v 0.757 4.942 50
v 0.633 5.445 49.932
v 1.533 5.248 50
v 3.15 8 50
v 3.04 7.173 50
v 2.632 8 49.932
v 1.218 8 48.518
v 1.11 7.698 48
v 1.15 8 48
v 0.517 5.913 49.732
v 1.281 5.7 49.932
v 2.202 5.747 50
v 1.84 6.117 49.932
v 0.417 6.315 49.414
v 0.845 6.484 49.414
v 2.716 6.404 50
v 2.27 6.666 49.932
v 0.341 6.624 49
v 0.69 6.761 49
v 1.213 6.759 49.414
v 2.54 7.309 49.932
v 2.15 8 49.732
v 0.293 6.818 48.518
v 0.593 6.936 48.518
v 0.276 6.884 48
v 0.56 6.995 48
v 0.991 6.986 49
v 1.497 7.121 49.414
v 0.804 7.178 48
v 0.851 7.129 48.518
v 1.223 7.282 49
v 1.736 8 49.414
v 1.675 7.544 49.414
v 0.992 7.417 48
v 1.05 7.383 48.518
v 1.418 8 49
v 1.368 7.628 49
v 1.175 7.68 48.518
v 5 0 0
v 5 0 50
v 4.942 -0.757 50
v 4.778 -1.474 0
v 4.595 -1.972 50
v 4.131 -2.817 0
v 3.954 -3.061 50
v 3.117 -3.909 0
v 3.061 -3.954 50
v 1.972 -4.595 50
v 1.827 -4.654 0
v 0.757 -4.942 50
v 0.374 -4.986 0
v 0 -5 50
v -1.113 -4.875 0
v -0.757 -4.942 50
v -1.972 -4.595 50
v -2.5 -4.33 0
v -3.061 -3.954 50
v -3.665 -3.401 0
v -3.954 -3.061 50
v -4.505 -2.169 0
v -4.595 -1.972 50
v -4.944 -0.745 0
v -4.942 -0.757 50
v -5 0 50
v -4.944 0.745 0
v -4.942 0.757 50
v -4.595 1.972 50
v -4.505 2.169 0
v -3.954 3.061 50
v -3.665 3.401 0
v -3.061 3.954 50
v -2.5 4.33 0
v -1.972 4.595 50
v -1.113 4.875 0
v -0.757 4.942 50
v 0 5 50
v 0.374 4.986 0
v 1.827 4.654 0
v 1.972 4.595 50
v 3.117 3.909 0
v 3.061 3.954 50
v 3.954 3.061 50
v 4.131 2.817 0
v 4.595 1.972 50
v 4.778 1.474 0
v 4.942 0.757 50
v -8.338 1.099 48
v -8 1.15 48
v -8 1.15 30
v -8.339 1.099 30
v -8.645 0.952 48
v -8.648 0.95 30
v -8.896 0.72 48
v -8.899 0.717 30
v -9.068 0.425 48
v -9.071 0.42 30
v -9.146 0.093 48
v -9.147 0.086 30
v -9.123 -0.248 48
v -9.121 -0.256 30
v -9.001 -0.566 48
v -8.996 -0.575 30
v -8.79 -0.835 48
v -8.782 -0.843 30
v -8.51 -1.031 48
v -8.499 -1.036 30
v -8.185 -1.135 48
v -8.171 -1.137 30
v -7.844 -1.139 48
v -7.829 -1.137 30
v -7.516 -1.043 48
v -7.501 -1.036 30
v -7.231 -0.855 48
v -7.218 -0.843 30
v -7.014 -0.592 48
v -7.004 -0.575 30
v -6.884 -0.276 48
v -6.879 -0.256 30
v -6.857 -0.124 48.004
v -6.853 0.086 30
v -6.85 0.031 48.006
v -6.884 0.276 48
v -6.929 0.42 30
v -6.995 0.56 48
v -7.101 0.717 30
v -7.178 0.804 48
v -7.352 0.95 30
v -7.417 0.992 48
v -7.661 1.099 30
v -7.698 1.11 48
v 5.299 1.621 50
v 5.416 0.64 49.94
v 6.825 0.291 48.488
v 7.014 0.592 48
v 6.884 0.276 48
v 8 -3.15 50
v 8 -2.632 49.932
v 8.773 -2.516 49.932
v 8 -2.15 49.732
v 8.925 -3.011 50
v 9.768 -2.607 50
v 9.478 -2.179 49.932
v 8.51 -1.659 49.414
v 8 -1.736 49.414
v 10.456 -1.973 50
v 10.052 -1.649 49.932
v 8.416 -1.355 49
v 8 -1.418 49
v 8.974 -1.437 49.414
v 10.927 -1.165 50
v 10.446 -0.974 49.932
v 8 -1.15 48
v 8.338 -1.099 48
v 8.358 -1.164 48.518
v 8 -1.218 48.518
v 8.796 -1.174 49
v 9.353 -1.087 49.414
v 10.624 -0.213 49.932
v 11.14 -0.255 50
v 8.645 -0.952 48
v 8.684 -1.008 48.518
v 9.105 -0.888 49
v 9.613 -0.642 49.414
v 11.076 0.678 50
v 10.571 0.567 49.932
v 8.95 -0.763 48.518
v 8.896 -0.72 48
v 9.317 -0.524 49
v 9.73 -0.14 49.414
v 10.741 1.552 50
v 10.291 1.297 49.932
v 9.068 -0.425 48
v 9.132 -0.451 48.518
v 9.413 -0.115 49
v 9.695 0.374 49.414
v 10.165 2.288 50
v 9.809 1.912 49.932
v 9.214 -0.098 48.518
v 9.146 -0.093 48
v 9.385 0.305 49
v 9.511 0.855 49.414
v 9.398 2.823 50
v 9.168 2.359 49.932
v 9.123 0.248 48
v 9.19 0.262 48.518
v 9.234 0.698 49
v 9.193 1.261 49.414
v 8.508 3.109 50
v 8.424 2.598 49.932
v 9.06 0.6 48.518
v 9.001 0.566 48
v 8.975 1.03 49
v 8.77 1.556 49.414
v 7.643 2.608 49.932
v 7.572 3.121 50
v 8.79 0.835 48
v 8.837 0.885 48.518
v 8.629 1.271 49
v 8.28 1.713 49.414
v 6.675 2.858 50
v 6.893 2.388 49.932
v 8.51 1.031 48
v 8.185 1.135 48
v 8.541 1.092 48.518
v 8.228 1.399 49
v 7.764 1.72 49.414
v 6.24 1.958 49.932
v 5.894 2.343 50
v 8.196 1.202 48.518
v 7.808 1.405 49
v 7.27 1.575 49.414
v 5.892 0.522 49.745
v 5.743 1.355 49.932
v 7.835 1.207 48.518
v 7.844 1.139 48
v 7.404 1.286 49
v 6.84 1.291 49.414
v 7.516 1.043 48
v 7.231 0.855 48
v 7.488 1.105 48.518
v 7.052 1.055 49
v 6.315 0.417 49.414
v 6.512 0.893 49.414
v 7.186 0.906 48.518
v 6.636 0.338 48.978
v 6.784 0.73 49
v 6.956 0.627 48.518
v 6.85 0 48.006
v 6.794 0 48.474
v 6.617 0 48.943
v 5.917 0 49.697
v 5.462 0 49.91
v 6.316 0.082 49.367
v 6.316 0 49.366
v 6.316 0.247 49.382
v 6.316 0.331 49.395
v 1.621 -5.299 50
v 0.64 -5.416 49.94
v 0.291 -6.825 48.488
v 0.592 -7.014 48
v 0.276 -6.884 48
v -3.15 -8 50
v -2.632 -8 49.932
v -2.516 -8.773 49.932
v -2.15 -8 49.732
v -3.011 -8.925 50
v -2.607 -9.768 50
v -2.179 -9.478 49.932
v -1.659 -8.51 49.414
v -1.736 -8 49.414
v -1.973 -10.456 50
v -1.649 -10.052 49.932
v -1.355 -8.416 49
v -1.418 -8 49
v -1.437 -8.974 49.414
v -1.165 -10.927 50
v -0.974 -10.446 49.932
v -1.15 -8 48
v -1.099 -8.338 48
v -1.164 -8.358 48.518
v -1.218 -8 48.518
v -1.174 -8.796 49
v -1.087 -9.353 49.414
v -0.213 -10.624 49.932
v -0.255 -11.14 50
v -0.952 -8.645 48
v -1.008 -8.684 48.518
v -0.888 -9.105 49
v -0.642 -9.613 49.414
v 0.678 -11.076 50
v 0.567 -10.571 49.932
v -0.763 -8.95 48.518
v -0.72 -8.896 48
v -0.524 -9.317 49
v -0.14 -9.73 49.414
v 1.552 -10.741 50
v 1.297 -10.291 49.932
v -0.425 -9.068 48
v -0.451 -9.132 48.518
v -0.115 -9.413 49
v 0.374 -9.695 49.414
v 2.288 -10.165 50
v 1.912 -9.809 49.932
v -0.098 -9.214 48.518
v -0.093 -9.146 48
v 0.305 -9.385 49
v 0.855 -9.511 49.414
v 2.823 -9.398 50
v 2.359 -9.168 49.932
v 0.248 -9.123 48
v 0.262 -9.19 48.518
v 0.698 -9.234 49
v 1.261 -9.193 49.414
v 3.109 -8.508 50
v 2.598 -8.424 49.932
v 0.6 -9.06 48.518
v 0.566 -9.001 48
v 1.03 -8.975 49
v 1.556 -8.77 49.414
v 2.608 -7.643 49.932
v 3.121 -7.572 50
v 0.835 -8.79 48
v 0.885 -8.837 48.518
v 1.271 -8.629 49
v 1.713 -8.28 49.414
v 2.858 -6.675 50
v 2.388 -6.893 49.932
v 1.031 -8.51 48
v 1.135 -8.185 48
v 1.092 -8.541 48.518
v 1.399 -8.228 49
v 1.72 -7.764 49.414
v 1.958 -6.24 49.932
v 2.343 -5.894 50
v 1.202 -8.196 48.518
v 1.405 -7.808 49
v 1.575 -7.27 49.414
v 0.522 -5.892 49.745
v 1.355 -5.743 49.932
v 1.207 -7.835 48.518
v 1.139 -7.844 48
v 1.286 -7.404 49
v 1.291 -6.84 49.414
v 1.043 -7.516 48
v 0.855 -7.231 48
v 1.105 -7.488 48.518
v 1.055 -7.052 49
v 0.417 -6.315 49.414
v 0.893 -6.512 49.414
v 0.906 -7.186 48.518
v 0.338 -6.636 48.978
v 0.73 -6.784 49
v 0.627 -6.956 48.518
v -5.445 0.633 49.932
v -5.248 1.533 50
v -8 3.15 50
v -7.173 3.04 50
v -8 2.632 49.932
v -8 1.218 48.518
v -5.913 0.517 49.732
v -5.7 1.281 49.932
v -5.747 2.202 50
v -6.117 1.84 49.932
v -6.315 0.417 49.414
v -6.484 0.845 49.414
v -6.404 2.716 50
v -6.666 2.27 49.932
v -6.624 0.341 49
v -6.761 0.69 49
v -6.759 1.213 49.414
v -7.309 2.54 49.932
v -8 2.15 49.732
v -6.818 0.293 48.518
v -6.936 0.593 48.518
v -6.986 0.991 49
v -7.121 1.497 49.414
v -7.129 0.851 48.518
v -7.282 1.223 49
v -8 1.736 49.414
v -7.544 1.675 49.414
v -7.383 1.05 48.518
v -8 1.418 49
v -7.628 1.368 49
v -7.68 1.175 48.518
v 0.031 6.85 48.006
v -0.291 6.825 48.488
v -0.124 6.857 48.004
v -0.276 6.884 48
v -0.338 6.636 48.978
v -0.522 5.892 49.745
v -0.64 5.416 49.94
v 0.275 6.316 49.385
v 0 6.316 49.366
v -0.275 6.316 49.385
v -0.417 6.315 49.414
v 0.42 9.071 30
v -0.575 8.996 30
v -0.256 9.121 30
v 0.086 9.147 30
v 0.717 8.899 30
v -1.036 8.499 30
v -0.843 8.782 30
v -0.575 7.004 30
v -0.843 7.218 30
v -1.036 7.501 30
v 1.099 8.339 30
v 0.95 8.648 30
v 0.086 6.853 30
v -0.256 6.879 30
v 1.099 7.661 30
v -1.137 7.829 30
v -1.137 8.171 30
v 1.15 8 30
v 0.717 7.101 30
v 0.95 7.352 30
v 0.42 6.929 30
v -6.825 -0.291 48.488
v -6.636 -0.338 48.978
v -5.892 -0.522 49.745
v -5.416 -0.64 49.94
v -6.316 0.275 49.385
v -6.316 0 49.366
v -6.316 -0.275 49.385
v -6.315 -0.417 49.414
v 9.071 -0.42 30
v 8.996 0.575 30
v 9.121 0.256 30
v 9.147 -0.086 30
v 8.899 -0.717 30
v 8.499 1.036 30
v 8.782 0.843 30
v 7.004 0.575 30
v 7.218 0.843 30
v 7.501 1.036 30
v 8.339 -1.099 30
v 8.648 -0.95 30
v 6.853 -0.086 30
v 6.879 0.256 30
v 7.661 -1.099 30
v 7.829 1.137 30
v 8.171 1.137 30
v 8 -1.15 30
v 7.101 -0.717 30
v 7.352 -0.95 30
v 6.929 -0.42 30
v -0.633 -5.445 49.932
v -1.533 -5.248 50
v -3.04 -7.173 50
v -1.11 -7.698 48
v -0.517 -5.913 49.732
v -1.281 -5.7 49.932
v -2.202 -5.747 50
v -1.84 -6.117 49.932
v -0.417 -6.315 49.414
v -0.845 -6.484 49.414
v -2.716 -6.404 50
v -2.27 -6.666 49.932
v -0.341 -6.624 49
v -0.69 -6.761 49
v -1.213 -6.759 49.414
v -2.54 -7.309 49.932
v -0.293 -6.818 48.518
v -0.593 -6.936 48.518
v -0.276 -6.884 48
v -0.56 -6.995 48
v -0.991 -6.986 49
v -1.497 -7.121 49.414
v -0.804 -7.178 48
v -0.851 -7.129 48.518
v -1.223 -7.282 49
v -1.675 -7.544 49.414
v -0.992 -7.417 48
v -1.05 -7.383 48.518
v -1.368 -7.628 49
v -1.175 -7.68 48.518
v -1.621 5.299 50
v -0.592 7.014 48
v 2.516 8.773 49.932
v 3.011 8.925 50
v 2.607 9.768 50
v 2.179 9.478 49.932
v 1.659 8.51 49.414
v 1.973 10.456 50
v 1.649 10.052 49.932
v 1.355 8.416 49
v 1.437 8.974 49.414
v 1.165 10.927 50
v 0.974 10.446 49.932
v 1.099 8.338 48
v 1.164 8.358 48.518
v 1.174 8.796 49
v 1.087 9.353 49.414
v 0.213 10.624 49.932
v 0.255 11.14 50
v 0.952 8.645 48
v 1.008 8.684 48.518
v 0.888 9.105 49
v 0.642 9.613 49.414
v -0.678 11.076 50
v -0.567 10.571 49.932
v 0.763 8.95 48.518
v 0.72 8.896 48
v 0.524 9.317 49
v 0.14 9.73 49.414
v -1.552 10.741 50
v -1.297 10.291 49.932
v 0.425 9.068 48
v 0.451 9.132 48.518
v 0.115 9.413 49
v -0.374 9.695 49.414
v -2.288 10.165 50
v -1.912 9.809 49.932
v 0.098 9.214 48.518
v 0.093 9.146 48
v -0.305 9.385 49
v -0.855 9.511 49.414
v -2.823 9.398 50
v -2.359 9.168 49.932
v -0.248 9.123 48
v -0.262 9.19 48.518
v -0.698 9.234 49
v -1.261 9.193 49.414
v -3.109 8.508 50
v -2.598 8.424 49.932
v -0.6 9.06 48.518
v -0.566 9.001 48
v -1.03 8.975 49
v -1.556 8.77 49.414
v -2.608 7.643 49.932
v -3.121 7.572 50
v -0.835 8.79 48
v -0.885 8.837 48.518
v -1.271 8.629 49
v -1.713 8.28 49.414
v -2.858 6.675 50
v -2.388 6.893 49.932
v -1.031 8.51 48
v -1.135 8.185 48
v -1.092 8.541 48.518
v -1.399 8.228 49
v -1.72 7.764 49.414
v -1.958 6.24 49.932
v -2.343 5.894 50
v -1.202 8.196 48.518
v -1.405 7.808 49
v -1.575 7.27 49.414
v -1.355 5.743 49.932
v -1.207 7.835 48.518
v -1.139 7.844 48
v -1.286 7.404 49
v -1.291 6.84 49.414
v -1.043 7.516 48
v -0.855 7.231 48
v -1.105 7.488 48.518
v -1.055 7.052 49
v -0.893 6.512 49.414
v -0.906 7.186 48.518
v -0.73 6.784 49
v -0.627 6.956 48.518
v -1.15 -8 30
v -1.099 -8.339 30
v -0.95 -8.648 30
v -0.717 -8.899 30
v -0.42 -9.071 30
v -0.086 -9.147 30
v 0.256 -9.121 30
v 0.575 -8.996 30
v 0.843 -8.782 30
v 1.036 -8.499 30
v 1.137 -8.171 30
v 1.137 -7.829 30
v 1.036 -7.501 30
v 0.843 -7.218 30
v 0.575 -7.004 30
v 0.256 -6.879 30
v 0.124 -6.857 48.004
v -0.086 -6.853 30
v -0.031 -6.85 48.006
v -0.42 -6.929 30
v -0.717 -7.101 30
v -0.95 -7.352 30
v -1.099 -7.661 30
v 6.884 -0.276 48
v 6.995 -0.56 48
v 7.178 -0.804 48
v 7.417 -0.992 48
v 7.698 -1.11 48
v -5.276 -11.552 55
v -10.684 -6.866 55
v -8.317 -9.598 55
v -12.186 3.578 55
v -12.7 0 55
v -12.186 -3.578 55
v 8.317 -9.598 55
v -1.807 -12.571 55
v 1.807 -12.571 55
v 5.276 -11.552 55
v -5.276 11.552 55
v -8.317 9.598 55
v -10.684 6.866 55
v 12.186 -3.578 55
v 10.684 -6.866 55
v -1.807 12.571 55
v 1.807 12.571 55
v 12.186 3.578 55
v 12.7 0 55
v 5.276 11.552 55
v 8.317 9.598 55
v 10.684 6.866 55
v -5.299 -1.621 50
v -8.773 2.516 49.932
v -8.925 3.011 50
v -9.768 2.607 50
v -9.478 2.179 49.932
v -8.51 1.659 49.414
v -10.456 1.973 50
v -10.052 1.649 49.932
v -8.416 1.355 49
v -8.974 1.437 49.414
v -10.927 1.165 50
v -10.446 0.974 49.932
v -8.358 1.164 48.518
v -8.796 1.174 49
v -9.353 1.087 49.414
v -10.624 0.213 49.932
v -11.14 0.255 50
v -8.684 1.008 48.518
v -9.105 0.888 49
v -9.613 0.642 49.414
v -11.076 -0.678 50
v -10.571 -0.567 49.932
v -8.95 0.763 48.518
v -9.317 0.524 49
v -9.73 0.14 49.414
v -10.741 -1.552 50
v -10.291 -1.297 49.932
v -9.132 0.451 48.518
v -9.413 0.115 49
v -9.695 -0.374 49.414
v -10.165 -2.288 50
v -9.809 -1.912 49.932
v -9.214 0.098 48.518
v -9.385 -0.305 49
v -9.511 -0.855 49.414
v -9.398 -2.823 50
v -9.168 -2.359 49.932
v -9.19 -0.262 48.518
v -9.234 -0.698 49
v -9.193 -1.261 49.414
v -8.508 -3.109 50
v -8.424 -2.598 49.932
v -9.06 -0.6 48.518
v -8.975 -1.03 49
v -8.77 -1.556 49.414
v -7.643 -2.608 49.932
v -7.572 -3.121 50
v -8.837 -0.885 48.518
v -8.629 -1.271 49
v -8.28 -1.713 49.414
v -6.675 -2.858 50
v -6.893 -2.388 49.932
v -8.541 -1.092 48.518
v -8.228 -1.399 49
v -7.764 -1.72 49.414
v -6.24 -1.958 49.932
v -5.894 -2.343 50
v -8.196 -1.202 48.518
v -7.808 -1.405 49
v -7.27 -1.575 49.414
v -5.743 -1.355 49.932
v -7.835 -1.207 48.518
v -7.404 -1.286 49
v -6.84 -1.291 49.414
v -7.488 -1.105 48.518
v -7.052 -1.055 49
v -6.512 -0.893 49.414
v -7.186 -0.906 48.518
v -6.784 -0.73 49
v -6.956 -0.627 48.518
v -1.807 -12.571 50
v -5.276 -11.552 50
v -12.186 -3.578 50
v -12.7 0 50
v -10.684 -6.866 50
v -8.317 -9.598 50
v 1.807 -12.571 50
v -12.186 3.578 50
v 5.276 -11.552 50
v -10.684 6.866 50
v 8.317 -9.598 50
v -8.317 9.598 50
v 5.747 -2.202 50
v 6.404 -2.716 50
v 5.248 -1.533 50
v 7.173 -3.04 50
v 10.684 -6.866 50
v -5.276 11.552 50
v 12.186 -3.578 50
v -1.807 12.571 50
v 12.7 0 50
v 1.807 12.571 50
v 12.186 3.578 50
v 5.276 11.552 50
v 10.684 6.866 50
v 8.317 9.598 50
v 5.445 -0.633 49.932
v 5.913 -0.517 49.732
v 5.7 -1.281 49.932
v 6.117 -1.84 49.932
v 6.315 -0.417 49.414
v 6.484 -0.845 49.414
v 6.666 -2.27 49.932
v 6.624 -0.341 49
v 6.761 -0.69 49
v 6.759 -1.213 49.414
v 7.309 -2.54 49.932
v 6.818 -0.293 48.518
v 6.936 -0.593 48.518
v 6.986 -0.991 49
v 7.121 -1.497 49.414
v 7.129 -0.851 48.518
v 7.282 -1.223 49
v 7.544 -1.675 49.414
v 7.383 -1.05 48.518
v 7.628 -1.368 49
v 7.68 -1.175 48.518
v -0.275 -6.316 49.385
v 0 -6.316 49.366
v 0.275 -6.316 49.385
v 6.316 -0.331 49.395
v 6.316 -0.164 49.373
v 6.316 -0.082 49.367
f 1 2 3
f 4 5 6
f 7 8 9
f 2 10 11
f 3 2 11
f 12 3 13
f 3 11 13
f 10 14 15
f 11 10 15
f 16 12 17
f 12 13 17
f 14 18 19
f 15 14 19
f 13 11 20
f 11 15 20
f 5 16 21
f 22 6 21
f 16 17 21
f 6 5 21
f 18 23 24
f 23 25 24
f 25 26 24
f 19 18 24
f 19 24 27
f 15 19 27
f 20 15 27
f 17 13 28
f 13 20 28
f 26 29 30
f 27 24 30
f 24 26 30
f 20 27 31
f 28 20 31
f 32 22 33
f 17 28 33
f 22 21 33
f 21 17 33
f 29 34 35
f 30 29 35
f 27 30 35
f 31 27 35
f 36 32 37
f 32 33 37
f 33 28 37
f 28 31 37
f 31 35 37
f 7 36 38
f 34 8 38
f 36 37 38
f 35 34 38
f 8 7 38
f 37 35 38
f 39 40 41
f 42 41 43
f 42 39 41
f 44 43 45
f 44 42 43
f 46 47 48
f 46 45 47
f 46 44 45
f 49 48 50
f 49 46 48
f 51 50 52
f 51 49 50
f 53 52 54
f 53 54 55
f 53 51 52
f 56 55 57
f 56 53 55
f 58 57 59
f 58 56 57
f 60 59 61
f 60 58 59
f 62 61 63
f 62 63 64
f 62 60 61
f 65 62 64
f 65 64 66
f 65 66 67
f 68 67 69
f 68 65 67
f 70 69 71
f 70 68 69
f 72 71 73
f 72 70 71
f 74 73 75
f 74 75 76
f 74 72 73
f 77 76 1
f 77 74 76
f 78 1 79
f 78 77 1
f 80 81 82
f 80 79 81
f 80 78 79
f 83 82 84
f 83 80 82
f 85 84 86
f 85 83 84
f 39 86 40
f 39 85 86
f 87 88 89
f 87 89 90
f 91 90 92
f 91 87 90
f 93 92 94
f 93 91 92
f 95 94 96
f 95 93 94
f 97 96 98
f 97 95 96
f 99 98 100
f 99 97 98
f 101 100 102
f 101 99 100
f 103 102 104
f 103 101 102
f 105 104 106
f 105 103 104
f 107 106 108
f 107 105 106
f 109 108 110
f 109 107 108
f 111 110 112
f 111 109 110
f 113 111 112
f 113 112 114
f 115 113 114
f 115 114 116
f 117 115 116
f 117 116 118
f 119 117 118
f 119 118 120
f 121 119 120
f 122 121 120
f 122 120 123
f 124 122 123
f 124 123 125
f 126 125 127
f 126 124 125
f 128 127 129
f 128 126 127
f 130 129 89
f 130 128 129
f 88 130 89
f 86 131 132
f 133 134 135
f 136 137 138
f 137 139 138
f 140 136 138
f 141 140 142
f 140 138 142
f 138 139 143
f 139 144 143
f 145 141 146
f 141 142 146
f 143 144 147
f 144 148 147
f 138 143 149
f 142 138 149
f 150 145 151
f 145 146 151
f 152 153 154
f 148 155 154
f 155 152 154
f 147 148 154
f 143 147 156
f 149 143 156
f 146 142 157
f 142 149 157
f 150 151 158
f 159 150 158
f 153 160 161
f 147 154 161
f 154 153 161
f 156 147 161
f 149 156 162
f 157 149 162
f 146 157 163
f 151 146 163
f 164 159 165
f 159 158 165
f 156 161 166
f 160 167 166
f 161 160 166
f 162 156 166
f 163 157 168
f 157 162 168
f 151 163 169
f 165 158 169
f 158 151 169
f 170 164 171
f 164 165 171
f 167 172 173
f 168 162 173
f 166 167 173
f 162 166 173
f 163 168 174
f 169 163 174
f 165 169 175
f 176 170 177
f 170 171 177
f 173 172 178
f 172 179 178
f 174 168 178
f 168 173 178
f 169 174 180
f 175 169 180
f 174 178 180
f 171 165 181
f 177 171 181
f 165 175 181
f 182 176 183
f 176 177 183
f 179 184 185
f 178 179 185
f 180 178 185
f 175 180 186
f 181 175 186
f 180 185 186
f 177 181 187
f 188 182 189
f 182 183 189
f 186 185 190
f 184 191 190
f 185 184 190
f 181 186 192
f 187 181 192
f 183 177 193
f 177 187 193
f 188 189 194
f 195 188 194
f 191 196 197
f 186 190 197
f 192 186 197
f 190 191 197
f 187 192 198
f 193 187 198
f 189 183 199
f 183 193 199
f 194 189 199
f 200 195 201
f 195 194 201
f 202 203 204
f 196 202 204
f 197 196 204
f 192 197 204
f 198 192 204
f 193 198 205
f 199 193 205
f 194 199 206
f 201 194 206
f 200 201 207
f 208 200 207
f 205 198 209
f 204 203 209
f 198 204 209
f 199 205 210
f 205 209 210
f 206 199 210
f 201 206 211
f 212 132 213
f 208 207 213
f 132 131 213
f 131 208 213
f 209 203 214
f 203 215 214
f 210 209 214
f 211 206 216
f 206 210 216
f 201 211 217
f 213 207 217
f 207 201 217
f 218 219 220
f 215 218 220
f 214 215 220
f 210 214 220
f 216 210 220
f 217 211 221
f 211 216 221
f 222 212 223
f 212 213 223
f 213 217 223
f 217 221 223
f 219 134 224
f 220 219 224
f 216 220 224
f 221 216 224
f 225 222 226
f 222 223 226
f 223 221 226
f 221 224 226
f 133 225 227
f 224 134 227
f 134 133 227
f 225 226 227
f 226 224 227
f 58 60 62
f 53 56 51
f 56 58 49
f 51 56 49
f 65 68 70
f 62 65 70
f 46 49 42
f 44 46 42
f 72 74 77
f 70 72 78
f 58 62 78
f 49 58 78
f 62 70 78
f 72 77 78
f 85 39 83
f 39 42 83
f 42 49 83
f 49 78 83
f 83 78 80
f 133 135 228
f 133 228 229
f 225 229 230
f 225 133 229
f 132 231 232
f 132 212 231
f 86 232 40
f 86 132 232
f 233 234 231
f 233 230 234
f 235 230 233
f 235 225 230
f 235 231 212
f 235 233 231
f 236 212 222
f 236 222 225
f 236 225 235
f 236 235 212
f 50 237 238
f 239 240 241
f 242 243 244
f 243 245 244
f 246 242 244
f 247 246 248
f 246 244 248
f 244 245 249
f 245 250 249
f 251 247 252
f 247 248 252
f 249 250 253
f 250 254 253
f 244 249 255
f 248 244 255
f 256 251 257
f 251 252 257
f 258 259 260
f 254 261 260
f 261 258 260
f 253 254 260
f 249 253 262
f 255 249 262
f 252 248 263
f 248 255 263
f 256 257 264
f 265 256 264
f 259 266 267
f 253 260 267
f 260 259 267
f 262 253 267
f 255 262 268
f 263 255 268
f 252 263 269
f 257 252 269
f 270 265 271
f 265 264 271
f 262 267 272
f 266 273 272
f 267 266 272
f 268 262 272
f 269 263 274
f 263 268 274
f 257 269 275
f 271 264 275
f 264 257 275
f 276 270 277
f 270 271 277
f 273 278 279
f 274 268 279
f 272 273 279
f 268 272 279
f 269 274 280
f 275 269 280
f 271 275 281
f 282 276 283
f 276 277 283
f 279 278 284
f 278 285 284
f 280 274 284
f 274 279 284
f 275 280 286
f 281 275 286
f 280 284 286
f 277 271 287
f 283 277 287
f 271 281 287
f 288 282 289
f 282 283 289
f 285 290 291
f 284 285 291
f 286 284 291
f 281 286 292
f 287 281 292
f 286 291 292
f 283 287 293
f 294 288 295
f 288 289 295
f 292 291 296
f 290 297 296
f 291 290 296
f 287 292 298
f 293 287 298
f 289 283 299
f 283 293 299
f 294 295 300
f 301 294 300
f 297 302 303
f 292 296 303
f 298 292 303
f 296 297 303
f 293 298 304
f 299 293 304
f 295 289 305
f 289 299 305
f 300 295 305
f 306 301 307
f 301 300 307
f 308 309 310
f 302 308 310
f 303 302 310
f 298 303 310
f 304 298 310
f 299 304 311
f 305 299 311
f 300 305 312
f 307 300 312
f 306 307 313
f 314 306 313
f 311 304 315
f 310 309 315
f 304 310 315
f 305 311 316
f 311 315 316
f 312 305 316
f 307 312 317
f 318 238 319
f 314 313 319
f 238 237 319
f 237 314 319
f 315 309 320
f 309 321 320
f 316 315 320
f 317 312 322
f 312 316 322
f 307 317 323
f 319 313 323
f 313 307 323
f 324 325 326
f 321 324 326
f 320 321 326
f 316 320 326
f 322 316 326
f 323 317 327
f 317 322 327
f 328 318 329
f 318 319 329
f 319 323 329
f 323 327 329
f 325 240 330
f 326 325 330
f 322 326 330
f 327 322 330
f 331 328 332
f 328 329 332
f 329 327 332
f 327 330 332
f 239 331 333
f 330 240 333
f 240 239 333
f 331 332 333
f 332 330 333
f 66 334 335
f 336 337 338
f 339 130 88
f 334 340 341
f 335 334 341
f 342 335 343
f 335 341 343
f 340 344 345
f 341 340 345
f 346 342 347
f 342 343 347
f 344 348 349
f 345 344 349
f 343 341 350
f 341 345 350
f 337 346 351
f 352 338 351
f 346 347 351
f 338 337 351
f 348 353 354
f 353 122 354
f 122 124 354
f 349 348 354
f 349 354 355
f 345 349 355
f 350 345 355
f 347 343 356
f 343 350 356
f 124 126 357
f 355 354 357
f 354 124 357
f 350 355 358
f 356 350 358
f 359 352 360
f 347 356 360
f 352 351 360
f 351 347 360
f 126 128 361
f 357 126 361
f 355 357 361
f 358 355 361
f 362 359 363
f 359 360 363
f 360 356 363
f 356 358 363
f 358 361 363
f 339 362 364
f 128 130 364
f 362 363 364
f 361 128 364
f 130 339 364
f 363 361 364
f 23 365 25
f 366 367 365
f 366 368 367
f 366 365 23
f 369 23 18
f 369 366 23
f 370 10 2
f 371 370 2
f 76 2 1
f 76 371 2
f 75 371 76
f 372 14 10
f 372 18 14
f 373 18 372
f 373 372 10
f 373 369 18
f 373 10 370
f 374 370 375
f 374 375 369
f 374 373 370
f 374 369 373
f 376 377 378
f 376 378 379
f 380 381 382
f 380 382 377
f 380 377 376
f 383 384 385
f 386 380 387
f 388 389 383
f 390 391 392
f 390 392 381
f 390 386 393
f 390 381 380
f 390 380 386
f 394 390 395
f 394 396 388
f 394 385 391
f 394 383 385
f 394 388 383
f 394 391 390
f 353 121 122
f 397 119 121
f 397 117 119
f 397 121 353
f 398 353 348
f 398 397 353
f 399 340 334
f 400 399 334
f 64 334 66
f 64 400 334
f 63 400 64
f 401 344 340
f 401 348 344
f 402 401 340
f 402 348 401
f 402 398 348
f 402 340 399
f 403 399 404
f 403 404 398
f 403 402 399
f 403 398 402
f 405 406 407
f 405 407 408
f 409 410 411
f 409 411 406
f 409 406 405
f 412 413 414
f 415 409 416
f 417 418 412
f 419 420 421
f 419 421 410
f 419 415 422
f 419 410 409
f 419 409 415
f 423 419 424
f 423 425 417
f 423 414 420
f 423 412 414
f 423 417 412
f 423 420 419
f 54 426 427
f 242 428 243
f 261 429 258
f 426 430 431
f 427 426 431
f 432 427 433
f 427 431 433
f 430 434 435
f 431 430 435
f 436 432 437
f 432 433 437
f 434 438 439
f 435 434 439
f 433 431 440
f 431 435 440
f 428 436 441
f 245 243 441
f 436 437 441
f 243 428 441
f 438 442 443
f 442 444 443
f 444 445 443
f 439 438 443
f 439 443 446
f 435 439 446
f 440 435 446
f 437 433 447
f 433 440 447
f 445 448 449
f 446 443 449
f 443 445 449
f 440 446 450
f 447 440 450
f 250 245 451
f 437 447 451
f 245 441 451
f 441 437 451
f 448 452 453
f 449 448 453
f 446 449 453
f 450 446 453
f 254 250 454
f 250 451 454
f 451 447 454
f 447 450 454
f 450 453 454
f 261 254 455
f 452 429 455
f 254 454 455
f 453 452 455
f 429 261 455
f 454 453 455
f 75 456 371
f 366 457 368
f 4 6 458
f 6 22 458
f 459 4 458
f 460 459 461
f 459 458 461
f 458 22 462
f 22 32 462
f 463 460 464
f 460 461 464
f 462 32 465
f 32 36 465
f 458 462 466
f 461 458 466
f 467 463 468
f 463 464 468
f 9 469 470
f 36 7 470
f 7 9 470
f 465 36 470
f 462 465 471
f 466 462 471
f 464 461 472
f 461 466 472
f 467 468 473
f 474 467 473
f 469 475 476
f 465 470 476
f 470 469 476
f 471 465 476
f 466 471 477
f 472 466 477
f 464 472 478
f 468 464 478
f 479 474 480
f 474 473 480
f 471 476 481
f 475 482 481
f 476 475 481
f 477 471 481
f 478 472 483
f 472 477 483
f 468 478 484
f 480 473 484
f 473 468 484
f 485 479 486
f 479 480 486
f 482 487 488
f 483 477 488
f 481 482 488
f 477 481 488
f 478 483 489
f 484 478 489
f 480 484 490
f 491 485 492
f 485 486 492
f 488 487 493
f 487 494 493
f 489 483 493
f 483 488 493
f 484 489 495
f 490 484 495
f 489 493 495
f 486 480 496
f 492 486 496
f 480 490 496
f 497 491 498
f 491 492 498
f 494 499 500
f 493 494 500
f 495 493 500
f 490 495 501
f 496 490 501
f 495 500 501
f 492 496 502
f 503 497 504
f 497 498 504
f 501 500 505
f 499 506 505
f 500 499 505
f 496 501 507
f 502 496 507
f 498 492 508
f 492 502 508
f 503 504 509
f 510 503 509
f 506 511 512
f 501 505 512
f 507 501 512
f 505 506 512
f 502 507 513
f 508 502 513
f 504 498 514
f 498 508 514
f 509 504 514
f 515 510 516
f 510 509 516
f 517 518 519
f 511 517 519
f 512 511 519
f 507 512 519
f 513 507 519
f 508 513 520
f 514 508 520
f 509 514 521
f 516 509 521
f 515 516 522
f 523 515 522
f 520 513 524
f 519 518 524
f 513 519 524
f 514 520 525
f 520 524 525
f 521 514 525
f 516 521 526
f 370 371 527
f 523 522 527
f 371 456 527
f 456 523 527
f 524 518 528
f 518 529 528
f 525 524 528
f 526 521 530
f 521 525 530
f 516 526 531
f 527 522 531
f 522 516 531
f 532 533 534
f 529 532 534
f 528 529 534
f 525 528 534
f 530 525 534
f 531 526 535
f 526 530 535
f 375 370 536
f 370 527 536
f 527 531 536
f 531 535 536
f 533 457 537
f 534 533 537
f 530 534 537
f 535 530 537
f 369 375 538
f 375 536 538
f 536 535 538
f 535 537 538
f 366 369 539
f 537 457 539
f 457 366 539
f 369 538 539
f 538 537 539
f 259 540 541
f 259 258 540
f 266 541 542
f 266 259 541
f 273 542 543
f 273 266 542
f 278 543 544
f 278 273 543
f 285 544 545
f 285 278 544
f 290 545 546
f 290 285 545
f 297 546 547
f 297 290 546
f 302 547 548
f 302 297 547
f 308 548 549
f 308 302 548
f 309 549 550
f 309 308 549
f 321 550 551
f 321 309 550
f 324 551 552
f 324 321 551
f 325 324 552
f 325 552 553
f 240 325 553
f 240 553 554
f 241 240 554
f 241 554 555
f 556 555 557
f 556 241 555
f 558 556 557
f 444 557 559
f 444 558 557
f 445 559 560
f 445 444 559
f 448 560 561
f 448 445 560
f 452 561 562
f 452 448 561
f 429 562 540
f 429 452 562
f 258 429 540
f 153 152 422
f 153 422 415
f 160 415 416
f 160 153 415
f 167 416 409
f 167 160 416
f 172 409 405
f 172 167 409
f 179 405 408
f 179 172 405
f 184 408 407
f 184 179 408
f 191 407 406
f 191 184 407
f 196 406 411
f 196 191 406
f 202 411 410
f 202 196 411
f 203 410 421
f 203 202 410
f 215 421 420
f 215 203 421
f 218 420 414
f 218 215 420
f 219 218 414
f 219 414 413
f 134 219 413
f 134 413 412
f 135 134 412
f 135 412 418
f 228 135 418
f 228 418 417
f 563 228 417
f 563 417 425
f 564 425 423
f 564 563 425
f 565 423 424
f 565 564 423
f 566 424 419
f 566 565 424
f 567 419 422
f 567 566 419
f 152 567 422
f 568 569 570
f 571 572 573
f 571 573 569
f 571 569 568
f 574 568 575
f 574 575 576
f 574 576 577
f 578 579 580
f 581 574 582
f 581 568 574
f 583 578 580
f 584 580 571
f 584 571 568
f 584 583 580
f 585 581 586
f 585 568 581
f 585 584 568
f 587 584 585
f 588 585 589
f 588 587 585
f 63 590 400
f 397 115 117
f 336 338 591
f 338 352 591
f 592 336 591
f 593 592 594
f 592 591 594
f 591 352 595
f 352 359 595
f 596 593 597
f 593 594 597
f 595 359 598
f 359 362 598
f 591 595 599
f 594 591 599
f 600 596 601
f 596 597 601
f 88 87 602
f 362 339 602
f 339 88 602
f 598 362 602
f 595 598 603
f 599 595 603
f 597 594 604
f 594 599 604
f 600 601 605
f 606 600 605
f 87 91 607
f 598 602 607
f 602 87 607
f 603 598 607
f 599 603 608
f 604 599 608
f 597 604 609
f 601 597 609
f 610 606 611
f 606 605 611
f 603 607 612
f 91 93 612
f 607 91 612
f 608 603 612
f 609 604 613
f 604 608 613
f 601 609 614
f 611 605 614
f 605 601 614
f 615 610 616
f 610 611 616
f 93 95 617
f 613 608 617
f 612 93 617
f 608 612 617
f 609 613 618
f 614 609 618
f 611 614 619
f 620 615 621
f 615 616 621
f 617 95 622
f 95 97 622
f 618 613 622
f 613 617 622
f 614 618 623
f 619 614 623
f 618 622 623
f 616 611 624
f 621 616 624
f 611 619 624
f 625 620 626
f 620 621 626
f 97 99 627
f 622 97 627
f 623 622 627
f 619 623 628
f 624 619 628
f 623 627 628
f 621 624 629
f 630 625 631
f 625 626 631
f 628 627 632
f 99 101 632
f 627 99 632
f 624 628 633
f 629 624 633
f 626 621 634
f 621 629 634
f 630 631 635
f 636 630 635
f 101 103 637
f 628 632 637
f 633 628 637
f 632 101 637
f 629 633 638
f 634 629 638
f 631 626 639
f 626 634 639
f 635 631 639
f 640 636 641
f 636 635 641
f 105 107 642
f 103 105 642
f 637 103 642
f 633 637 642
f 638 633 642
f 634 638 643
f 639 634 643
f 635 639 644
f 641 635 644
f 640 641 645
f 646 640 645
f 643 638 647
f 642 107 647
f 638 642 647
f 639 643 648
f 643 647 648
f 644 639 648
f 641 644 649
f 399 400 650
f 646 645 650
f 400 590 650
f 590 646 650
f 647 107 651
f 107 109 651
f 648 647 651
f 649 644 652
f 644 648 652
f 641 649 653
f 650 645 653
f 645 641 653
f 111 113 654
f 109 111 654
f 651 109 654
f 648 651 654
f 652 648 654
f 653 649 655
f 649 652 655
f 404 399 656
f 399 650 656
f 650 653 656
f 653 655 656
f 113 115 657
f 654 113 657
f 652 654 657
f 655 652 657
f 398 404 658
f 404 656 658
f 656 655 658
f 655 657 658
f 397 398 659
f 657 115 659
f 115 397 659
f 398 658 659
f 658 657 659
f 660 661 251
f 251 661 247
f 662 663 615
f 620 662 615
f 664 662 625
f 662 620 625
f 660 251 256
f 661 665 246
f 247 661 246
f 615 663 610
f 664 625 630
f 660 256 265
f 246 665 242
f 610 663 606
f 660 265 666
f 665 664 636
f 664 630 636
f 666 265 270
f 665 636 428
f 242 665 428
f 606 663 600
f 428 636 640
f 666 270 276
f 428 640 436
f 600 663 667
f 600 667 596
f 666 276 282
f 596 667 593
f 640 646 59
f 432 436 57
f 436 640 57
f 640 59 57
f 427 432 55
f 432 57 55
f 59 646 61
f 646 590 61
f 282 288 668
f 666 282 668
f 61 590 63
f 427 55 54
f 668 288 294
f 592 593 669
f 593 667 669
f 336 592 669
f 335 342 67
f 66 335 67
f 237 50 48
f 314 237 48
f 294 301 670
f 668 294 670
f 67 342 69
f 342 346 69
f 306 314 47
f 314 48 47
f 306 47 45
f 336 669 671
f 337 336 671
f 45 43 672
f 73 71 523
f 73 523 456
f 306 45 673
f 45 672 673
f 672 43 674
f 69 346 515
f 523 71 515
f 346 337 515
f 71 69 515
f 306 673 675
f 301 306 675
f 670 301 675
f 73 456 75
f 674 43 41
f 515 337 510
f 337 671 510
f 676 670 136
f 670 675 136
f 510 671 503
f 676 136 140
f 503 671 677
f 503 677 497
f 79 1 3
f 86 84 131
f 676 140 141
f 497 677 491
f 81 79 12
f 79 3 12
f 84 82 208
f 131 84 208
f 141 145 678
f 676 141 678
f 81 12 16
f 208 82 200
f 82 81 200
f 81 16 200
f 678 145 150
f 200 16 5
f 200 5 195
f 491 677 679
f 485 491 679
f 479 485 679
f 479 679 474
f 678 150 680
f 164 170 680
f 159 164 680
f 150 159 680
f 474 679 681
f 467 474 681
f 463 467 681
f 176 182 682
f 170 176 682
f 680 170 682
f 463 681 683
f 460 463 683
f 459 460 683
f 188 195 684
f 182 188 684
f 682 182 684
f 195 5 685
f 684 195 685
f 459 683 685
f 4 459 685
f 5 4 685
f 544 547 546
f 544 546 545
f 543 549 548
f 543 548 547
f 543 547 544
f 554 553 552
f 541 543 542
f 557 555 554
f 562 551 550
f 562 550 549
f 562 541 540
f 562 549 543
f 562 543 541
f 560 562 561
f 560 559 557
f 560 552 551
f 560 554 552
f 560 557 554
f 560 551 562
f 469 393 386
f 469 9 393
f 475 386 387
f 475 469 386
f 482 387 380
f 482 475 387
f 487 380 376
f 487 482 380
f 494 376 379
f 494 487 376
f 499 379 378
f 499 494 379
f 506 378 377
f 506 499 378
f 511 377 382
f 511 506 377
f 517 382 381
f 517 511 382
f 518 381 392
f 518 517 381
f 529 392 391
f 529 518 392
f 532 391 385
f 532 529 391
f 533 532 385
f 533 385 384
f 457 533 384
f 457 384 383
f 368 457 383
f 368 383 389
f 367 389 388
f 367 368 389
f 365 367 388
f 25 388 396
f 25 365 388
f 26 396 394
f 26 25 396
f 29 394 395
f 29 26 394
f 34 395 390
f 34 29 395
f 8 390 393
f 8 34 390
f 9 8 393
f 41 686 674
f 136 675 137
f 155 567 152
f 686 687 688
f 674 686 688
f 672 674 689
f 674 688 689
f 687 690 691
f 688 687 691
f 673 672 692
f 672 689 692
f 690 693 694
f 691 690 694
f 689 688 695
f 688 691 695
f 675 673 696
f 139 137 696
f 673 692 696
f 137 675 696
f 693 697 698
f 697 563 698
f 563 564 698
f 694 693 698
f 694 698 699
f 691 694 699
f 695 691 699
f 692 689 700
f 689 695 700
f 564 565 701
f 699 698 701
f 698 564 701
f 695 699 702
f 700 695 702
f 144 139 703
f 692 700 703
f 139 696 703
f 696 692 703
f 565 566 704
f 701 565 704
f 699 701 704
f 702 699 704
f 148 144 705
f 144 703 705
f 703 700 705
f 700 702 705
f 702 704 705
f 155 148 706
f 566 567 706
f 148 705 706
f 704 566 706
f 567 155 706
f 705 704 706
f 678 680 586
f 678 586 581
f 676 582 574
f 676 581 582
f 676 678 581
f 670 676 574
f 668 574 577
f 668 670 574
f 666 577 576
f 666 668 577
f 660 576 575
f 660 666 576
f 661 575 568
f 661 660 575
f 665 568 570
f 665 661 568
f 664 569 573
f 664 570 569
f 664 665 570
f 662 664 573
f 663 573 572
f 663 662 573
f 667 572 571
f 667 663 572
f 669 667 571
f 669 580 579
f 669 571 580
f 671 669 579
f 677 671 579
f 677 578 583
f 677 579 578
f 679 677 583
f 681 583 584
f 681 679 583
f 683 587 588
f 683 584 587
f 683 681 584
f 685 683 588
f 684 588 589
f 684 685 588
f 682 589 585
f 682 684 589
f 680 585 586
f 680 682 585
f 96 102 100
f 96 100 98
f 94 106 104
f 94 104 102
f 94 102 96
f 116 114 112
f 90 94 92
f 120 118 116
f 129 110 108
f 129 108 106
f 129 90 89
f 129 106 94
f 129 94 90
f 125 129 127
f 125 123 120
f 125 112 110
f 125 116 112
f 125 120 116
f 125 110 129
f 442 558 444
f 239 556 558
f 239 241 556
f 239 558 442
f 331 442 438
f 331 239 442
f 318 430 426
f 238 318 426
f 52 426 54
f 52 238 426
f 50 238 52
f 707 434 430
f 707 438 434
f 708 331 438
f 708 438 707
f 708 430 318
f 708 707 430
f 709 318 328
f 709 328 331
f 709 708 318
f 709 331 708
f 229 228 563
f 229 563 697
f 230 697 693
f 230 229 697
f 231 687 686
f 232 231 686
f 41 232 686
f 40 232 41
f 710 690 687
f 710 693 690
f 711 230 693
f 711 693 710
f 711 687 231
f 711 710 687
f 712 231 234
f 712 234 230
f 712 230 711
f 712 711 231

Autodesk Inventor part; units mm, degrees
ref_plane "YZ Plane" through (0, 0, 0) normal (1, 0, 0) x (0, 1, 0)
ref_plane "XZ Plane" through (0, 0, 0) normal (0, 1, 0) x (-1, 0, 0)
ref_plane "XY Plane" through (0, 0, 0) normal (0, 0, 1) x (1, 0, 0)
sketch "Sketch1" plane through (0, 0, 0) normal (0, 0, 1) x (1, 0, 0)
  circle A0 centre (0, 0) radius 5
  dimension "d0" = 10
extrude "Extrusion1" add sketch "Sketch1" along normal blind 50
sketch "Sketch2" plane through (0, 0, 50) normal (0, 0, 1) x (1, 0, 0)
  circle A0 centre (0, 0) radius 5 projected
  circle A1 centre (0, 0) radius 12.7
  dimension "d3" = 25.4
extrude "Extrusion2" add sketch "Sketch2" along normal blind 5 contours A0 | A1
sketch "Sketch4" plane through (0, 0, 50) normal (0, 0, -1) x (-1, 0, 0)
  circle A0 centre (0, -8) radius 1.15
  point P0 (0, 0)
  dimension "d6" = 2.3
  dimension "d7" = 8
extrude "Extrusion3" add sketch "Sketch4" along normal blind 20
pattern_circular "Circular Pattern1" count 4 over 360 about axis through (0, 0, -10) along (0, 0, 1) of "Extrusion3"
fillet "Fillet1" radius 2 4 edges at (8, 1.15, 50) (1.15, -8, 50) (-1.15, 8, 50) (-8, -1.15, 50)
properties part number "Molde para barra solida hueca"
